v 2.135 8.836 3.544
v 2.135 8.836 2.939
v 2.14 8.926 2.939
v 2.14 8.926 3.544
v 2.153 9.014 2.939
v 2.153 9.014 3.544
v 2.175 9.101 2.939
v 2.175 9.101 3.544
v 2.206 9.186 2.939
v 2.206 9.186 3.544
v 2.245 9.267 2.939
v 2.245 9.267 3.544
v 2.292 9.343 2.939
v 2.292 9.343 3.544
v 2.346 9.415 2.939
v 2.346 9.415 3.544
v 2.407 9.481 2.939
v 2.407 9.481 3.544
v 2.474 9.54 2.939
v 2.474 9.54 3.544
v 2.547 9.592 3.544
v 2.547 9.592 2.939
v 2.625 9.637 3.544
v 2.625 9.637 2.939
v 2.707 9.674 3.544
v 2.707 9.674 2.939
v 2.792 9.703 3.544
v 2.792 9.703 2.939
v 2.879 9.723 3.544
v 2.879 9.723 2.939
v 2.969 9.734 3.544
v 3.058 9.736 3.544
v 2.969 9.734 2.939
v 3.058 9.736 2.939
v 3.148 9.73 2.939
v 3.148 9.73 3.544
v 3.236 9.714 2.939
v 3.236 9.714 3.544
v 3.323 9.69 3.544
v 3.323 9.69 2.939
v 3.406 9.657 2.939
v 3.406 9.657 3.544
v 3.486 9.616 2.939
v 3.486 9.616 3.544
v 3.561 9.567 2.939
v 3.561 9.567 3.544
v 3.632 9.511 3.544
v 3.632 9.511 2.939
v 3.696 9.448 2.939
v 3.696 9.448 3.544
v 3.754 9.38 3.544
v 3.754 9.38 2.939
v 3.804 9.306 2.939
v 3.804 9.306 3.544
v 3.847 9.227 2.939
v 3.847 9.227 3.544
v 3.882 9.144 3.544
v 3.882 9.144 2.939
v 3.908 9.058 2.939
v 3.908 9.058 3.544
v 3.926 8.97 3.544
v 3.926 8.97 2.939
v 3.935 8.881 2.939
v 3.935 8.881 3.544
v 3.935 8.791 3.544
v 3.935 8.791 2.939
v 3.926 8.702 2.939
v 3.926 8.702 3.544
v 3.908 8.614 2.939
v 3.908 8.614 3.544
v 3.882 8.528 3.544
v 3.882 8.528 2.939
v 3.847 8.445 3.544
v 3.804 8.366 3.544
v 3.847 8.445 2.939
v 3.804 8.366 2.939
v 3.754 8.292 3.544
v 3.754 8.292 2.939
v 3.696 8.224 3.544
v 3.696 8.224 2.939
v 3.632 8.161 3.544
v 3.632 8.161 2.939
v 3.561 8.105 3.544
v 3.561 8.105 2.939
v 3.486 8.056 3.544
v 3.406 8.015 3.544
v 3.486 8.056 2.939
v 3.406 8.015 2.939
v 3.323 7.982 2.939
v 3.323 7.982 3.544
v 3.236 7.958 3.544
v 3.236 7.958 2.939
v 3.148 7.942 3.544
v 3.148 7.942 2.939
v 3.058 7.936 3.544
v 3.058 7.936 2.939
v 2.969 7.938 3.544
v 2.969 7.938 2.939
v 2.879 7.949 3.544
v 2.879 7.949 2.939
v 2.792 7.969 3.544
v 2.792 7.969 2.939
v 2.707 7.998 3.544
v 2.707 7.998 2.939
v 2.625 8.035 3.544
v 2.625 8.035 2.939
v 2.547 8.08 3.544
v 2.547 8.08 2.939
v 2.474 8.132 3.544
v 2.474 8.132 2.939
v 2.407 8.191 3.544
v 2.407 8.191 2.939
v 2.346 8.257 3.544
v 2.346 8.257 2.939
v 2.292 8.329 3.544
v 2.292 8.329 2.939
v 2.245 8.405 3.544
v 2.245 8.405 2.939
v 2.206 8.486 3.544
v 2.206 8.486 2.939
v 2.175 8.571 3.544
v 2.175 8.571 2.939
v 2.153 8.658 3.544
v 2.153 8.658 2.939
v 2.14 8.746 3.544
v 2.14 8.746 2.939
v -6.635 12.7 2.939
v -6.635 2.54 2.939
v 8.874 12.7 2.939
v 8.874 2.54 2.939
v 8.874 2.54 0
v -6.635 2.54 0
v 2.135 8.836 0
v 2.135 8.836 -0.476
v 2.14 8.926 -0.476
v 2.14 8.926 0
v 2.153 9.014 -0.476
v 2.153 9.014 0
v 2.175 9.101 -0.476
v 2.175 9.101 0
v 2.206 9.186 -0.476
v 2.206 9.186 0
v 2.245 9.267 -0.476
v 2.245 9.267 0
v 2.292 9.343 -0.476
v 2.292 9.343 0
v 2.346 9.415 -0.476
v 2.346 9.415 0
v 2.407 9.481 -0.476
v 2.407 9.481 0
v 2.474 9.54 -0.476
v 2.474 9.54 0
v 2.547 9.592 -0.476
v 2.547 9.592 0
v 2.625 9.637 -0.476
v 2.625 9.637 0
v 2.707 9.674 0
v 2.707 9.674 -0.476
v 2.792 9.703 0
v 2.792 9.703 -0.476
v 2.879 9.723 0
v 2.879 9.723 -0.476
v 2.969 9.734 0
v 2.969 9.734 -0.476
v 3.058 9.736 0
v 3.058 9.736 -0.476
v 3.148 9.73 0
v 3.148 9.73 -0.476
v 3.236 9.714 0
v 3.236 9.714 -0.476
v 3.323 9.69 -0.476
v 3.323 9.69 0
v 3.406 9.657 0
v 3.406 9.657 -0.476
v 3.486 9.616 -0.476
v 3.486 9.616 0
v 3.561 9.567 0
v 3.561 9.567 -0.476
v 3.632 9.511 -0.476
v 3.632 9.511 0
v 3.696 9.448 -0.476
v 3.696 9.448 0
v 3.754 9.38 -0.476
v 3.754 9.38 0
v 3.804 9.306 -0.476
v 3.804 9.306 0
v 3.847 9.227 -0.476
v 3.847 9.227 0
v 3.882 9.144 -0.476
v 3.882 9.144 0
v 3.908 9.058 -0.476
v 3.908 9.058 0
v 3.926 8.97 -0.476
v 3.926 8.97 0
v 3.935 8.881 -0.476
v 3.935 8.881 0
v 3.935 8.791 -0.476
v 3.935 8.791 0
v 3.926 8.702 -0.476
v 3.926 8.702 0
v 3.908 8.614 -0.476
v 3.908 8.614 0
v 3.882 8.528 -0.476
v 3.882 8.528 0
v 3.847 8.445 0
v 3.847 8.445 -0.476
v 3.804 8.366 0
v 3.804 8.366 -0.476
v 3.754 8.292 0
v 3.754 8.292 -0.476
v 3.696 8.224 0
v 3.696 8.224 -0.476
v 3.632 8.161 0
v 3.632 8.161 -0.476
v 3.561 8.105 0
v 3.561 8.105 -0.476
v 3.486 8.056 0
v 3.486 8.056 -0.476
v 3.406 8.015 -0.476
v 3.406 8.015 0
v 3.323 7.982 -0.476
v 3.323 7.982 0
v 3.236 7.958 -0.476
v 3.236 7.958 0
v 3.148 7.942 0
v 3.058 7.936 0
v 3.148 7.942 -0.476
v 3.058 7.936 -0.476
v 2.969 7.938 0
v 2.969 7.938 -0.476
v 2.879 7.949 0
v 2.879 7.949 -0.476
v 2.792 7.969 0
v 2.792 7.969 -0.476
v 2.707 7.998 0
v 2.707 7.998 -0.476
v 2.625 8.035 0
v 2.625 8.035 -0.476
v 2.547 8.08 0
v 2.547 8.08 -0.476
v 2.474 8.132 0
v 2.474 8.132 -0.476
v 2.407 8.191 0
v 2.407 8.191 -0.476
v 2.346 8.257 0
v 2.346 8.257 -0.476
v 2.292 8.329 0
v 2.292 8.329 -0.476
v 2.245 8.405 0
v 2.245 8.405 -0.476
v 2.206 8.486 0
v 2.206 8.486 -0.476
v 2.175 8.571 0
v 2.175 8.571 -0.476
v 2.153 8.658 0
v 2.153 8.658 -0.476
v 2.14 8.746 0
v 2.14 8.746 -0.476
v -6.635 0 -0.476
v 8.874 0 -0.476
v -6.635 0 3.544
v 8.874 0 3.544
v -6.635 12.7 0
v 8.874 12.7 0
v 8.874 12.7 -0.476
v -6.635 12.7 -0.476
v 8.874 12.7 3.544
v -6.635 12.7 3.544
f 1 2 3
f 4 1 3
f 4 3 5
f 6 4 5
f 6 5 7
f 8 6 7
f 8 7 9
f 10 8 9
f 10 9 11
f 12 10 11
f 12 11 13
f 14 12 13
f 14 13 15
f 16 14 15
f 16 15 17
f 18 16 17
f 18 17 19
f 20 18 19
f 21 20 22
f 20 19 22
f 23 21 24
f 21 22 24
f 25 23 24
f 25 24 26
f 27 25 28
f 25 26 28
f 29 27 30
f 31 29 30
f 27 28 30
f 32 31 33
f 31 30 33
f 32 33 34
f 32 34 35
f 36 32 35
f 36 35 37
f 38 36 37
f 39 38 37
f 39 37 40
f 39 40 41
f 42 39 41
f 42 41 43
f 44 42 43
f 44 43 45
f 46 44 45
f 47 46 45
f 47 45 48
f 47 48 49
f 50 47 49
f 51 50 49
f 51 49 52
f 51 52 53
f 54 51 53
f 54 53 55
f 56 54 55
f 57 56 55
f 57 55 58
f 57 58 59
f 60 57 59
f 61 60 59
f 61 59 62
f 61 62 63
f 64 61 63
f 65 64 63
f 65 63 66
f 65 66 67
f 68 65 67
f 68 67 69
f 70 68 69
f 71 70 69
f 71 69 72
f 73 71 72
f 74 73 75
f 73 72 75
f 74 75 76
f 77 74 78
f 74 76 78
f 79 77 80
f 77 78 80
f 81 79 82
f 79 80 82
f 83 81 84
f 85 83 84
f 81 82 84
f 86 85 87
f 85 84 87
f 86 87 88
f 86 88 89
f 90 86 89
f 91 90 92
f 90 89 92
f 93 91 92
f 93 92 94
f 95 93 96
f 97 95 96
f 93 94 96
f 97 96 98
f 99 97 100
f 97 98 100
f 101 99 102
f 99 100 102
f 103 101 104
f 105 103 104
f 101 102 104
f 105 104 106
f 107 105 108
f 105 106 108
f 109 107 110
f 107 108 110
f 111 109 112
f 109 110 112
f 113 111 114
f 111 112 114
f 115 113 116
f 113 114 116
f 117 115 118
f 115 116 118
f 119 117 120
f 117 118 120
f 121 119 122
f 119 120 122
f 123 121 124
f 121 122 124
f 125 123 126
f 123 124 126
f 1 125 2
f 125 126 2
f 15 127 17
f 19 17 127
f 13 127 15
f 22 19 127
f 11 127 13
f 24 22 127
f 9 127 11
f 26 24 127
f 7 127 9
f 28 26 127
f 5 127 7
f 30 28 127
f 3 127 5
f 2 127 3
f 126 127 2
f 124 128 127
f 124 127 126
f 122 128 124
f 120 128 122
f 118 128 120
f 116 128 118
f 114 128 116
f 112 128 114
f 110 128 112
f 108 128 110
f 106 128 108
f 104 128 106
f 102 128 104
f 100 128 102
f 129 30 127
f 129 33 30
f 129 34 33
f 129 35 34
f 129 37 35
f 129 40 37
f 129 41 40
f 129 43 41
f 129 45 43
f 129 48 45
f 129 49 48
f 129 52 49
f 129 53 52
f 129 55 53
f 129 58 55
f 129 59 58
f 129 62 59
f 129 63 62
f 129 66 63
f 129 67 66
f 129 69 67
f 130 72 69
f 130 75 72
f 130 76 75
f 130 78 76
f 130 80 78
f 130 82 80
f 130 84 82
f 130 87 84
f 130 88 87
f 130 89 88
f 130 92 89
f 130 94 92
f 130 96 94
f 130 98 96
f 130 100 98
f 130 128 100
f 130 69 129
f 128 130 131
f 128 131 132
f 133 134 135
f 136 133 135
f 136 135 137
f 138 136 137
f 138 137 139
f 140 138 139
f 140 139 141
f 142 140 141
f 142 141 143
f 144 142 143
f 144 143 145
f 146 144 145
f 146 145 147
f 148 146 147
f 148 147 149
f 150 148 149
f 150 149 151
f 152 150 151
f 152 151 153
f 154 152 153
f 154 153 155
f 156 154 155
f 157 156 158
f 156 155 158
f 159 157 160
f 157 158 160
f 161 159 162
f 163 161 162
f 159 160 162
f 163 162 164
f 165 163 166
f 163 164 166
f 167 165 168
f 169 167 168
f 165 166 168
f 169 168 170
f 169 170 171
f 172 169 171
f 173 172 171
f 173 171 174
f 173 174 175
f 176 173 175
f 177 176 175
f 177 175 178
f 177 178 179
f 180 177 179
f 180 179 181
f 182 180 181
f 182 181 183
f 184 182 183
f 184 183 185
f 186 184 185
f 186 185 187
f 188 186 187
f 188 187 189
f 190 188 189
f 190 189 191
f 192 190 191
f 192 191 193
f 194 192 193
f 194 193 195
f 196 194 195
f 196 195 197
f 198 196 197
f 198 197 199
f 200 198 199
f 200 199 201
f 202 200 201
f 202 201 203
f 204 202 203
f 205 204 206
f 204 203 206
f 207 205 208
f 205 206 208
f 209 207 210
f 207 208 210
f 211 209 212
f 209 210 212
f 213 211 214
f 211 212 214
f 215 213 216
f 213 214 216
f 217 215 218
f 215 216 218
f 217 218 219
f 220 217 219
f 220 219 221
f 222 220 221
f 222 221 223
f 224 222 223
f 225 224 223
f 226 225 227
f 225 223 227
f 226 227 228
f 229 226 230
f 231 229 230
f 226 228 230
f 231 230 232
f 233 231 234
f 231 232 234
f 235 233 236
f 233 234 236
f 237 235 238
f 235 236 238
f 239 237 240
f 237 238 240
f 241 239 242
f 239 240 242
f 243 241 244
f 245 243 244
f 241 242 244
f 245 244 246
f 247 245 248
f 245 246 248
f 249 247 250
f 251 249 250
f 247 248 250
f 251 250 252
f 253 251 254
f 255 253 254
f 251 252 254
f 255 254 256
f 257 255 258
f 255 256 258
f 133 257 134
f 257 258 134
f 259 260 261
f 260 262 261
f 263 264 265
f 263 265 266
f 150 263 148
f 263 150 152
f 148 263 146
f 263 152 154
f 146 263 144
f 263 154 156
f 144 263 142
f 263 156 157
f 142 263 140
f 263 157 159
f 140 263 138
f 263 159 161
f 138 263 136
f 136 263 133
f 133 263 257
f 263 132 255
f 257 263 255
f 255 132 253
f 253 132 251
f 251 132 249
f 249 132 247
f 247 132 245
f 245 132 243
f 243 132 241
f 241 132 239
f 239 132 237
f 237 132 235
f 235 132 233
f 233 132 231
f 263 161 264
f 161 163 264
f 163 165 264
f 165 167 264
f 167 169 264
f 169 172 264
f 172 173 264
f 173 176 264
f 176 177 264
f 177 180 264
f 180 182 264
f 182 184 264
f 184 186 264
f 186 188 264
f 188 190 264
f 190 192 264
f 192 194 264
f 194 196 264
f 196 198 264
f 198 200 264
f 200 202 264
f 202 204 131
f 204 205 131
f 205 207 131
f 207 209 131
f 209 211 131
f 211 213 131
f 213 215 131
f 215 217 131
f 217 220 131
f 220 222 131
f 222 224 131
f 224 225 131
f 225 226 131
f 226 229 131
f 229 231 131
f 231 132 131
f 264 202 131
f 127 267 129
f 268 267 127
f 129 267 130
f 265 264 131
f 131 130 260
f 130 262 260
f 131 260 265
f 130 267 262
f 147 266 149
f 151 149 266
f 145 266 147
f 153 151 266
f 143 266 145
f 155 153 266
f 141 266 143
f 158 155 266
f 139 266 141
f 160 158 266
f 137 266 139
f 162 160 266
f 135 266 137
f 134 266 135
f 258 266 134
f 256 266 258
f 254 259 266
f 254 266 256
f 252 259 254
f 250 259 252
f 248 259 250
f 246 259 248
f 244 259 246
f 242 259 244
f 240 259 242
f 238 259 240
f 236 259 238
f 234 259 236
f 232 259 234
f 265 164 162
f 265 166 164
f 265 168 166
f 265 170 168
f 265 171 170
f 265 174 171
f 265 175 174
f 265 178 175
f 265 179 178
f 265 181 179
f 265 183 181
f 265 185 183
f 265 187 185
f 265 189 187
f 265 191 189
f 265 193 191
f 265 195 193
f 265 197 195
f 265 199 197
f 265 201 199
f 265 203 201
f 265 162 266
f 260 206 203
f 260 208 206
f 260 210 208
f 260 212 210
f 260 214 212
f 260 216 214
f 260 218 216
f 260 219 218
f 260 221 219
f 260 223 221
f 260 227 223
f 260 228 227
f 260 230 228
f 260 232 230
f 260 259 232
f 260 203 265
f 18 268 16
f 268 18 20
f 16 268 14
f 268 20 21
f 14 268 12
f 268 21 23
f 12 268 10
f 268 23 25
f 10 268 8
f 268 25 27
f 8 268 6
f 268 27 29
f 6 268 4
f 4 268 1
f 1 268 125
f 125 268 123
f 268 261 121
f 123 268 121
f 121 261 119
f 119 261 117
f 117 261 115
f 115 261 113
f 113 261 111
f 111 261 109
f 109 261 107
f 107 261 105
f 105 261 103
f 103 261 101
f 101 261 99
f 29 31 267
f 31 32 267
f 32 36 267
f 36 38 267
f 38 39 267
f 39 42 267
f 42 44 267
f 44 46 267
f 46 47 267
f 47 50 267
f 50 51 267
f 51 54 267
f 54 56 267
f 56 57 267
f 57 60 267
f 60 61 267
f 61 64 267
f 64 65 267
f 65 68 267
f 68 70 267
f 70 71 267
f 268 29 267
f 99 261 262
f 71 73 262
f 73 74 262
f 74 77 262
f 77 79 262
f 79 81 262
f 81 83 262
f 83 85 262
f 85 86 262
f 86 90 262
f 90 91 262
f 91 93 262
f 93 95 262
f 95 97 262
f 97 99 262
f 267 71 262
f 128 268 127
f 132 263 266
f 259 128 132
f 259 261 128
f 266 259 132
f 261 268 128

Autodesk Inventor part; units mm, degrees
ref_plane "YZ Plane" through (0, 0, 0) normal (1, 0, 0) x (0, 1, 0)
ref_plane "XZ Plane" through (0, 0, 0) normal (0, 1, 0) x (-1, 0, 0)
ref_plane "XY Plane" through (0, 0, 0) normal (0, 0, 1) x (1, 0, 0)
sketch "Sketch1" plane through (0, 0, 0) normal (0, 1, 0) x (-1, 0, 0)
  line L0 (0, 2.9392) -> (6.6347, 2.9392)
  line L1 (6.6347, 2.9392) -> (6.6347, 0)
  line L2 (6.6347, 0) -> (0, 0)
  line L3 (6.6347, 0) -> (6.6347, -0.4755)
  line L4 (6.6347, -0.4755) -> (0, -0.4755)
  line L5 (6.6347, 2.9392) -> (6.6347, 3.5443)
  line L6 (6.6347, 3.5443) -> (0, 3.5443)
  line L7 (0, 2.9392) -> (-8.8742, 2.9392)
  line L8 (-8.8742, 2.9392) -> (-8.8742, 0)
  line L9 (-8.8742, 0) -> (0, 0)
  line L10 (0, -0.4755) -> (-8.8742, -0.4755)
  line L11 (-8.8742, -0.4755) -> (-8.8742, 0)
  line L12 (0, 3.5443) -> (-8.8742, 3.5443)
  line L13 (-8.8742, 3.5443) -> (-8.8742, 2.9392)
extrude "Extrusion4" add sketch "Sketch1" along normal blind 12.7 contours L7 L13 L12 L6 L5 L0
extrude "Extrusion5" add sketch "Sketch1" along normal blind 12.7 contours L3 L4 L10 L11 L9 L2
extrude "Extrusion6" add sketch "Sketch1" along normal blind 2.54 contours L0 L1 L2 L9 L8 L7
sketch "Sketch2" plane through (8.8742, 0, -0.4755) normal (0, 0, -1) x (-1, 0, 0)
  circle A0 centre (5.8384, 8.836) radius 0.9005
  point P0 (8.8742, 0)
extrude "Extrusion7" cut sketch "Sketch2" against normal blind 25.4
properties part number "hook diagram"
